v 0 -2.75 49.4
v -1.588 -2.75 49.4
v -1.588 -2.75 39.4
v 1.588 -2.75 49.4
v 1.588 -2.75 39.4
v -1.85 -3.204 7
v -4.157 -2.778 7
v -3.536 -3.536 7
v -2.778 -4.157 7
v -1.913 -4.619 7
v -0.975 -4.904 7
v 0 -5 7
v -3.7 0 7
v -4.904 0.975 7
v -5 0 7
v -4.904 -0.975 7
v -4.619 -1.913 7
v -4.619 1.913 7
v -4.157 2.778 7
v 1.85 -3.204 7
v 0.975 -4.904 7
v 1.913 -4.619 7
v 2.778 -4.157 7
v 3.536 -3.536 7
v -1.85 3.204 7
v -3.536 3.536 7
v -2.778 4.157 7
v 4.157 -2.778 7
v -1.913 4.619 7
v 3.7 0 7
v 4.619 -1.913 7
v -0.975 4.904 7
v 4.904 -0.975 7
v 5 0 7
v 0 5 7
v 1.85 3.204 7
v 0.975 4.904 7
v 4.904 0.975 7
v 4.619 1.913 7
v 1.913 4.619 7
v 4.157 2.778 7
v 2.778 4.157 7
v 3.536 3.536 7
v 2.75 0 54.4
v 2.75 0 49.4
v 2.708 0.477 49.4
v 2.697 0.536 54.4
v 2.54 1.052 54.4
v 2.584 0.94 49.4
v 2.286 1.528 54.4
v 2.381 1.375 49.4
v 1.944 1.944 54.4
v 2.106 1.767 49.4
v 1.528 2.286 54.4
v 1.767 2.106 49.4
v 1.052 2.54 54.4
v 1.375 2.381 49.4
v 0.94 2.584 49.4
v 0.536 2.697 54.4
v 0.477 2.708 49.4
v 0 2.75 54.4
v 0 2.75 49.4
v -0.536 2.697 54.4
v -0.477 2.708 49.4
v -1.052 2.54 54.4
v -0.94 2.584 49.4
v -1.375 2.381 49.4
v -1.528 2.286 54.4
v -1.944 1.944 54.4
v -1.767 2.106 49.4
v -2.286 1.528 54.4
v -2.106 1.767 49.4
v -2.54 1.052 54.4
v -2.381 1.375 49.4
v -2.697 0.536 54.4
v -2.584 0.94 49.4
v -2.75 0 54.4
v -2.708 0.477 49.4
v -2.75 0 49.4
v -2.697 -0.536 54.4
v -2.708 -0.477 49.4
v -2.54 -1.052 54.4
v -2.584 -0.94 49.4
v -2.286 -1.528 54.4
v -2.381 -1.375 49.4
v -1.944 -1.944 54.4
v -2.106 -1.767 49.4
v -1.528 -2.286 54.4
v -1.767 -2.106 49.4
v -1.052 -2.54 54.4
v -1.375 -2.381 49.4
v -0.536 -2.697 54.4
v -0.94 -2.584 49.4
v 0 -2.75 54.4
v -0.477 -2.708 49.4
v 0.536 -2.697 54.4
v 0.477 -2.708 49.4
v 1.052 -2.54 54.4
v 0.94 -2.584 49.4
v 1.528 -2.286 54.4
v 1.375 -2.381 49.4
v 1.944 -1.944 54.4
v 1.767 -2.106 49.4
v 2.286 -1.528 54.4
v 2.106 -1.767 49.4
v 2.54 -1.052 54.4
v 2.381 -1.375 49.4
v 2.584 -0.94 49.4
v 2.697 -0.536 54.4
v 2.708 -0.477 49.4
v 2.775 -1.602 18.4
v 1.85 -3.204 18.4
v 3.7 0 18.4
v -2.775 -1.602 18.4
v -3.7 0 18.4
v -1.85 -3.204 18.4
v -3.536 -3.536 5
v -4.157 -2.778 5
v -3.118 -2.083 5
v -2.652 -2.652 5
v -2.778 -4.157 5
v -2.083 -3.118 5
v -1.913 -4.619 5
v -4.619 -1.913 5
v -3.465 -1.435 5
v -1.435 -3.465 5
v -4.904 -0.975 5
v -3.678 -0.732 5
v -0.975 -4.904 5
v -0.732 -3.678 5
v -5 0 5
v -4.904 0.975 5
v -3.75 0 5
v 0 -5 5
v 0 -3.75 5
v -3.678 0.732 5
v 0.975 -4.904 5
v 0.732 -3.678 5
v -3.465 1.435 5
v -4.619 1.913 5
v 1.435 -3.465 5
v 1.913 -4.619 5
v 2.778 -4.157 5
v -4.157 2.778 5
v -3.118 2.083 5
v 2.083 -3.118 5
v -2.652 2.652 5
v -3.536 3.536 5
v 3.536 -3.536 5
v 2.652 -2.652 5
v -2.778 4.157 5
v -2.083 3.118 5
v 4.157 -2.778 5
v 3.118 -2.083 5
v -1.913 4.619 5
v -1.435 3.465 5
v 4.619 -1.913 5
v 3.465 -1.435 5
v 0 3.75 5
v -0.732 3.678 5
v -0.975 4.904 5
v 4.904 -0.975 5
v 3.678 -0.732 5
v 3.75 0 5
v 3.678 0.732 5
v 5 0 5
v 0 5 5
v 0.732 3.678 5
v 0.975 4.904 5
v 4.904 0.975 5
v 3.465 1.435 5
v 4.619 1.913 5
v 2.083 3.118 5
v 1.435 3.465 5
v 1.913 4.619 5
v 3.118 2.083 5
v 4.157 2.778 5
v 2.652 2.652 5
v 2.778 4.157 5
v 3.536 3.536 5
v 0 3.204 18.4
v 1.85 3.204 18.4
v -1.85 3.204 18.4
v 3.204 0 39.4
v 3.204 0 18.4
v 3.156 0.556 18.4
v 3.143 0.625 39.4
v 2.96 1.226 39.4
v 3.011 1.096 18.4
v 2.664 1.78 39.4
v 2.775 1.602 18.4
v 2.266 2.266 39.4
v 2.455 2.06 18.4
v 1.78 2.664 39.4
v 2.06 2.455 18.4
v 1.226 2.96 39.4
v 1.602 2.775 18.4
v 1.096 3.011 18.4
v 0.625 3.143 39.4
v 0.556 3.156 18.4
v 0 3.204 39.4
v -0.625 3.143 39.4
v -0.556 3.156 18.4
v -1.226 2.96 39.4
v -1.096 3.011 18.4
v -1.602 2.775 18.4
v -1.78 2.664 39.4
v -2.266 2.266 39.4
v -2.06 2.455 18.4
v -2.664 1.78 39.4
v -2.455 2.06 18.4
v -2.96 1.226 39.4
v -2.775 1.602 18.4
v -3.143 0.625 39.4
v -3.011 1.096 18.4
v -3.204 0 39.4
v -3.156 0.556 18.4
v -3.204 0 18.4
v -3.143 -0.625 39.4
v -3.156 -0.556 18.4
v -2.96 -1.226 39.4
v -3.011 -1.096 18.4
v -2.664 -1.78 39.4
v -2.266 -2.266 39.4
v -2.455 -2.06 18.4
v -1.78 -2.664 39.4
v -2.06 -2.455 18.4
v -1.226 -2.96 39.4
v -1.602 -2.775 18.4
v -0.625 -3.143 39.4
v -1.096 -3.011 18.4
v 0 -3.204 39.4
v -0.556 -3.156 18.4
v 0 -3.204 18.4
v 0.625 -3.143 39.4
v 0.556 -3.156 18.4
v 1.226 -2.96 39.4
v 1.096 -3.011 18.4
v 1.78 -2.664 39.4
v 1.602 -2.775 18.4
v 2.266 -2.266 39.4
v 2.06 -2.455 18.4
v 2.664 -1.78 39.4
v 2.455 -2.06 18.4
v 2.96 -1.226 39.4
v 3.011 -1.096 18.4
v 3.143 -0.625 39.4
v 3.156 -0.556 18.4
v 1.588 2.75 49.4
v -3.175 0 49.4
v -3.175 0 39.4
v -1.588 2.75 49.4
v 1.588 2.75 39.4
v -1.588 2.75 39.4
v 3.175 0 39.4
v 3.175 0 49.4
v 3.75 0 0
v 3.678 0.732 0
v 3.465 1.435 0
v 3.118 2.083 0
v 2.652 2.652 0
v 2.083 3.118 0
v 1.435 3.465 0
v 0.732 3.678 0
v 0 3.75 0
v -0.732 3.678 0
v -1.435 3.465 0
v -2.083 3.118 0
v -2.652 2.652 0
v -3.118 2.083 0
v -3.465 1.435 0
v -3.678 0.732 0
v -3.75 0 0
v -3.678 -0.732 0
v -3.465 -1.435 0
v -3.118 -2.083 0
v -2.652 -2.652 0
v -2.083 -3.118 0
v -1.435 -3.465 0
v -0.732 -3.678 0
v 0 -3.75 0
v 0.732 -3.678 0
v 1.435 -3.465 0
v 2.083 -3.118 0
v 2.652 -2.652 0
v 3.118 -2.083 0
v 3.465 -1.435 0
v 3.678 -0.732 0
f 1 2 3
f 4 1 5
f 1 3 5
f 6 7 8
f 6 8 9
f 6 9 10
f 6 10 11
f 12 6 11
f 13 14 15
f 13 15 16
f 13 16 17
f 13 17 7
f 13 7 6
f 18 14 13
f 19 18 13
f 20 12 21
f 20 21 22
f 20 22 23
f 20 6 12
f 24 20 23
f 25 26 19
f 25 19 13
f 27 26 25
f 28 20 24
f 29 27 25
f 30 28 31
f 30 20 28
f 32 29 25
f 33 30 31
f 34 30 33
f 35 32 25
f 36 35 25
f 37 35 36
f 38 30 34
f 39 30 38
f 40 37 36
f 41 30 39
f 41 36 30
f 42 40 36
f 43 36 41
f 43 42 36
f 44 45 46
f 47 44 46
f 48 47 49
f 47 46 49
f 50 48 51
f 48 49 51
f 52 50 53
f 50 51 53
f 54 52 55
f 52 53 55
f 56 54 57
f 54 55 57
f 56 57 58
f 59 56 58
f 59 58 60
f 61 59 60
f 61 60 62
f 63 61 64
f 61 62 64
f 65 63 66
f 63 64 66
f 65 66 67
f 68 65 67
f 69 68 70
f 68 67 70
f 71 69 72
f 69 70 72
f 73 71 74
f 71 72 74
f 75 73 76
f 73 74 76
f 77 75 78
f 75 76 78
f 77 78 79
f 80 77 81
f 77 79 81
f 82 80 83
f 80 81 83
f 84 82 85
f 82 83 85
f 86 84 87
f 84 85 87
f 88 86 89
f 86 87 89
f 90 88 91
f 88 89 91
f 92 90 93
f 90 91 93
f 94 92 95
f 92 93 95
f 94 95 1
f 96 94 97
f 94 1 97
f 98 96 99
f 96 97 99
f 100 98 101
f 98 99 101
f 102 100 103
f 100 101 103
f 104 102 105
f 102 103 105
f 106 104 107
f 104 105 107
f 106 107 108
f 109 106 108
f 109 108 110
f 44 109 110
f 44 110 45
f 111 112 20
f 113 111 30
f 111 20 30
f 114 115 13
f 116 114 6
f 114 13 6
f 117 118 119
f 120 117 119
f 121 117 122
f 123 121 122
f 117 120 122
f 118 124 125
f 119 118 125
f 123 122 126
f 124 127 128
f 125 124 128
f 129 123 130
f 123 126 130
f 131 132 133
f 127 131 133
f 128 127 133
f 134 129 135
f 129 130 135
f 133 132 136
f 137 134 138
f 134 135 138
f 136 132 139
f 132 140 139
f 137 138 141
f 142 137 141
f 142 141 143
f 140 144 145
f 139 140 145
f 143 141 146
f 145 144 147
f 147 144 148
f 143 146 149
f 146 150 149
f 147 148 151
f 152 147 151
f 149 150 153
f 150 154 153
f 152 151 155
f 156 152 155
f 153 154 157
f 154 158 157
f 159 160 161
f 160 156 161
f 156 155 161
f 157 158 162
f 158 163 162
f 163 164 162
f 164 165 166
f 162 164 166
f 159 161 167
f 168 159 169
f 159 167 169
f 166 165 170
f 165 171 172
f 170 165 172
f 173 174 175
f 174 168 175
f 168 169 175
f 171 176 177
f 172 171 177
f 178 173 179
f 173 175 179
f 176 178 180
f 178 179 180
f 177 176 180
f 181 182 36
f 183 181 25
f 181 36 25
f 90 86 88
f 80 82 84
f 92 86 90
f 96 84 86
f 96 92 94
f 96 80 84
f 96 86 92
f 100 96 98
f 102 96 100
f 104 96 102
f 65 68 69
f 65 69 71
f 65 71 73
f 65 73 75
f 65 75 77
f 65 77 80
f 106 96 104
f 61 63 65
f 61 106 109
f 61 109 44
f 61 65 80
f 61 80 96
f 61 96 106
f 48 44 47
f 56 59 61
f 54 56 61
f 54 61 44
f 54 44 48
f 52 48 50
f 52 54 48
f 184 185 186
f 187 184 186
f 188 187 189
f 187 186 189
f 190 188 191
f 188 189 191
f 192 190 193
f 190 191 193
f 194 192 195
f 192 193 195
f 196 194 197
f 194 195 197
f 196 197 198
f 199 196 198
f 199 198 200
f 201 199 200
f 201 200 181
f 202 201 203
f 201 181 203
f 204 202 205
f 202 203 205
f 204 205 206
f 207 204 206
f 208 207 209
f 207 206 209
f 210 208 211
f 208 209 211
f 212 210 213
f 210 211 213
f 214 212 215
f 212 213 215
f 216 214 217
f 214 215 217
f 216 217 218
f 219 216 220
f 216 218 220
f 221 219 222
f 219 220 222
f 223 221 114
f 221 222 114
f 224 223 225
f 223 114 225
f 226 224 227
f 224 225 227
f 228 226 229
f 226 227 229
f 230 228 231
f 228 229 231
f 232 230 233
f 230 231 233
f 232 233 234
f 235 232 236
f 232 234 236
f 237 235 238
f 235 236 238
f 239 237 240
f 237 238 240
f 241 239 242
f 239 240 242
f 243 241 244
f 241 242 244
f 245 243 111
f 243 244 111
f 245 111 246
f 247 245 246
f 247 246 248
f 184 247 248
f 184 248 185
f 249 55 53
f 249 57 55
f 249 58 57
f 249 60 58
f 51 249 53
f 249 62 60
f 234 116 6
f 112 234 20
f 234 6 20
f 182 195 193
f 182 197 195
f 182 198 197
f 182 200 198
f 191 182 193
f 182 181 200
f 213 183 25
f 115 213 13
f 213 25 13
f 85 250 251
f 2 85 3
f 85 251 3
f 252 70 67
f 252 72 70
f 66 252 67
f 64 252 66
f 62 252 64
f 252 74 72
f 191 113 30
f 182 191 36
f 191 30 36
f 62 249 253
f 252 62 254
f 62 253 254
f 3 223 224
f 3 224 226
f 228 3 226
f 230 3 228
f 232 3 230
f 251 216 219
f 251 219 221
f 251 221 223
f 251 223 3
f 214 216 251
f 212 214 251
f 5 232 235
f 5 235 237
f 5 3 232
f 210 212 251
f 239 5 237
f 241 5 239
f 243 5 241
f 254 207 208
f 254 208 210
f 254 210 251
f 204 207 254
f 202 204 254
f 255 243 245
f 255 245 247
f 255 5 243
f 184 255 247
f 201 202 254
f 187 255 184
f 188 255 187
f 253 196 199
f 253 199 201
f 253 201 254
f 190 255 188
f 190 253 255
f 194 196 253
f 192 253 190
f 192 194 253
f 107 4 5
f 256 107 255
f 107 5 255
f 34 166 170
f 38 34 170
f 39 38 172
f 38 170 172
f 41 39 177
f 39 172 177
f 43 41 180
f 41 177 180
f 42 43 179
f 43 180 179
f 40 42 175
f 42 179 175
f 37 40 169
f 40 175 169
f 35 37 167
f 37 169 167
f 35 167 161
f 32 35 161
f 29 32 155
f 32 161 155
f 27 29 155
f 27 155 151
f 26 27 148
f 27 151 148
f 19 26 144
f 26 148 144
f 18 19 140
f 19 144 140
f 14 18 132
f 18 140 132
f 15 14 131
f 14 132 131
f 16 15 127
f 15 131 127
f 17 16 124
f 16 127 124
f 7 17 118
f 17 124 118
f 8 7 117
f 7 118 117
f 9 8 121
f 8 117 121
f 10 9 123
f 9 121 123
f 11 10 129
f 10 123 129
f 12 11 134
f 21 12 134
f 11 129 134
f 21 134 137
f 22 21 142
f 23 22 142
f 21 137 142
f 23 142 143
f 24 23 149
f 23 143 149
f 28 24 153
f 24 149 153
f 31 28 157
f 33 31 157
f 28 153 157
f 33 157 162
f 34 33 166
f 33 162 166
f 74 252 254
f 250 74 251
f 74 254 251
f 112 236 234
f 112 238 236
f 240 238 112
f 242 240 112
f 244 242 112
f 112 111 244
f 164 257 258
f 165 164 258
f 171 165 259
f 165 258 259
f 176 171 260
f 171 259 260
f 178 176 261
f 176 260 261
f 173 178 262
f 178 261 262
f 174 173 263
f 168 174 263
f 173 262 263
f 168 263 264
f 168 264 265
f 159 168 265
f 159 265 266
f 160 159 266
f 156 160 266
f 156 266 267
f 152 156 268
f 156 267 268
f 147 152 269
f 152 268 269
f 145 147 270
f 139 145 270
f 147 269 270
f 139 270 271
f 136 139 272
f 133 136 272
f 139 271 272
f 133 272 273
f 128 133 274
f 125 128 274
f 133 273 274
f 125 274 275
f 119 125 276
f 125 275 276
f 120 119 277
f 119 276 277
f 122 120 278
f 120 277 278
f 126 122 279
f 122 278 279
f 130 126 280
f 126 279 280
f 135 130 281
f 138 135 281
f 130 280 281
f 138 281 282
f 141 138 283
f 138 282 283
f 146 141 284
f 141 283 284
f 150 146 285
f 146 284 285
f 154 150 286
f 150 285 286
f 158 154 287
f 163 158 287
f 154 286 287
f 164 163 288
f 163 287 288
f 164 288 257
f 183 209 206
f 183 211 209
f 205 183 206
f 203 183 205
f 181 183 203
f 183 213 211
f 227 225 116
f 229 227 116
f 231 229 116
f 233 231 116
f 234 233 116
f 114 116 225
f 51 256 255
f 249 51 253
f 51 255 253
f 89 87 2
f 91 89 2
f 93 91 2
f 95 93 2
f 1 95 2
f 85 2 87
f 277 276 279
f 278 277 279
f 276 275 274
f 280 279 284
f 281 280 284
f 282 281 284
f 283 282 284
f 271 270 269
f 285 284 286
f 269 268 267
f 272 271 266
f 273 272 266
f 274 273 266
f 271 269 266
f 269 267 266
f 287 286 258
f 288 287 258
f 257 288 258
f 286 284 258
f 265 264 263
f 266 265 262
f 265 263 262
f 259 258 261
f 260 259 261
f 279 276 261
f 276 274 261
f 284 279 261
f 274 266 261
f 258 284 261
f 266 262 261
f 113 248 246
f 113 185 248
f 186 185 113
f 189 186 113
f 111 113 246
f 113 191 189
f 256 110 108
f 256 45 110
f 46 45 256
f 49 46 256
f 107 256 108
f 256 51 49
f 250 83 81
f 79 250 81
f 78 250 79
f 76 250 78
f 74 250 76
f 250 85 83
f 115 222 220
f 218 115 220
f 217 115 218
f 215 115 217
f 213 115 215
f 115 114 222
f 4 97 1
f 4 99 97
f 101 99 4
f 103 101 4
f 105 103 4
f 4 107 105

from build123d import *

# Parameters (mm, degrees)
SKETCH1_R           = 3.75
BOSS_EXTRUDE1_DEPTH = 5
SKETCH2_R           = 5
BOSS_EXTRUDE2_DEPTH = 2
BOSS_EXTRUDE3_DEPTH = 11.4
SKETCH4_R           = 3.204293994
BOSS_EXTRUDE4_DEPTH = 21
BOSS_EXTRUDE5_DEPTH = 10
SKETCH6_R           = 2.749630657
BOSS_EXTRUDE6_DEPTH = 5


with BuildPart() as part:
    # Sketch1 → Boss-Extrude1 (new body)
    with BuildSketch(Plane.XY):
        Circle(SKETCH1_R)
    extrude(amount=BOSS_EXTRUDE1_DEPTH)

    # Sketch2 → Boss-Extrude2 (add)
    with BuildSketch(Plane.XY.offset(5)):
        Circle(SKETCH2_R)
    extrude(amount=BOSS_EXTRUDE2_DEPTH)

    # Sketch3 → Boss-Extrude3 (add)
    with BuildSketch(Plane.XY.offset(7)):
        Polygon((3.7, 0), (1.85, 3.204293994), (-1.85, 3.204293994), (-3.7, 0), (-1.85, -3.204293994), (1.85, -3.204293994), align=None)
    extrude(amount=BOSS_EXTRUDE3_DEPTH)

    # Sketch4 → Boss-Extrude4 (add)
    with BuildSketch(Plane.XY.offset(18.4)):
        Circle(SKETCH4_R)
    extrude(amount=BOSS_EXTRUDE4_DEPTH)

    # Sketch5 → Boss-Extrude5 (add)
    with BuildSketch(Plane.XY.offset(39.4)):
        Polygon((3.175, 0), (1.5875, 2.749630657), (-1.5875, 2.749630657), (-3.175, 0), (-1.5875, -2.749630657), (1.5875, -2.749630657), align=None)
    extrude(amount=BOSS_EXTRUDE5_DEPTH)

    # Sketch6 → Boss-Extrude6 (add)
    with BuildSketch(Plane.XY.offset(49.4)):
        Circle(SKETCH6_R)
    extrude(amount=BOSS_EXTRUDE6_DEPTH)


solid = part.part
